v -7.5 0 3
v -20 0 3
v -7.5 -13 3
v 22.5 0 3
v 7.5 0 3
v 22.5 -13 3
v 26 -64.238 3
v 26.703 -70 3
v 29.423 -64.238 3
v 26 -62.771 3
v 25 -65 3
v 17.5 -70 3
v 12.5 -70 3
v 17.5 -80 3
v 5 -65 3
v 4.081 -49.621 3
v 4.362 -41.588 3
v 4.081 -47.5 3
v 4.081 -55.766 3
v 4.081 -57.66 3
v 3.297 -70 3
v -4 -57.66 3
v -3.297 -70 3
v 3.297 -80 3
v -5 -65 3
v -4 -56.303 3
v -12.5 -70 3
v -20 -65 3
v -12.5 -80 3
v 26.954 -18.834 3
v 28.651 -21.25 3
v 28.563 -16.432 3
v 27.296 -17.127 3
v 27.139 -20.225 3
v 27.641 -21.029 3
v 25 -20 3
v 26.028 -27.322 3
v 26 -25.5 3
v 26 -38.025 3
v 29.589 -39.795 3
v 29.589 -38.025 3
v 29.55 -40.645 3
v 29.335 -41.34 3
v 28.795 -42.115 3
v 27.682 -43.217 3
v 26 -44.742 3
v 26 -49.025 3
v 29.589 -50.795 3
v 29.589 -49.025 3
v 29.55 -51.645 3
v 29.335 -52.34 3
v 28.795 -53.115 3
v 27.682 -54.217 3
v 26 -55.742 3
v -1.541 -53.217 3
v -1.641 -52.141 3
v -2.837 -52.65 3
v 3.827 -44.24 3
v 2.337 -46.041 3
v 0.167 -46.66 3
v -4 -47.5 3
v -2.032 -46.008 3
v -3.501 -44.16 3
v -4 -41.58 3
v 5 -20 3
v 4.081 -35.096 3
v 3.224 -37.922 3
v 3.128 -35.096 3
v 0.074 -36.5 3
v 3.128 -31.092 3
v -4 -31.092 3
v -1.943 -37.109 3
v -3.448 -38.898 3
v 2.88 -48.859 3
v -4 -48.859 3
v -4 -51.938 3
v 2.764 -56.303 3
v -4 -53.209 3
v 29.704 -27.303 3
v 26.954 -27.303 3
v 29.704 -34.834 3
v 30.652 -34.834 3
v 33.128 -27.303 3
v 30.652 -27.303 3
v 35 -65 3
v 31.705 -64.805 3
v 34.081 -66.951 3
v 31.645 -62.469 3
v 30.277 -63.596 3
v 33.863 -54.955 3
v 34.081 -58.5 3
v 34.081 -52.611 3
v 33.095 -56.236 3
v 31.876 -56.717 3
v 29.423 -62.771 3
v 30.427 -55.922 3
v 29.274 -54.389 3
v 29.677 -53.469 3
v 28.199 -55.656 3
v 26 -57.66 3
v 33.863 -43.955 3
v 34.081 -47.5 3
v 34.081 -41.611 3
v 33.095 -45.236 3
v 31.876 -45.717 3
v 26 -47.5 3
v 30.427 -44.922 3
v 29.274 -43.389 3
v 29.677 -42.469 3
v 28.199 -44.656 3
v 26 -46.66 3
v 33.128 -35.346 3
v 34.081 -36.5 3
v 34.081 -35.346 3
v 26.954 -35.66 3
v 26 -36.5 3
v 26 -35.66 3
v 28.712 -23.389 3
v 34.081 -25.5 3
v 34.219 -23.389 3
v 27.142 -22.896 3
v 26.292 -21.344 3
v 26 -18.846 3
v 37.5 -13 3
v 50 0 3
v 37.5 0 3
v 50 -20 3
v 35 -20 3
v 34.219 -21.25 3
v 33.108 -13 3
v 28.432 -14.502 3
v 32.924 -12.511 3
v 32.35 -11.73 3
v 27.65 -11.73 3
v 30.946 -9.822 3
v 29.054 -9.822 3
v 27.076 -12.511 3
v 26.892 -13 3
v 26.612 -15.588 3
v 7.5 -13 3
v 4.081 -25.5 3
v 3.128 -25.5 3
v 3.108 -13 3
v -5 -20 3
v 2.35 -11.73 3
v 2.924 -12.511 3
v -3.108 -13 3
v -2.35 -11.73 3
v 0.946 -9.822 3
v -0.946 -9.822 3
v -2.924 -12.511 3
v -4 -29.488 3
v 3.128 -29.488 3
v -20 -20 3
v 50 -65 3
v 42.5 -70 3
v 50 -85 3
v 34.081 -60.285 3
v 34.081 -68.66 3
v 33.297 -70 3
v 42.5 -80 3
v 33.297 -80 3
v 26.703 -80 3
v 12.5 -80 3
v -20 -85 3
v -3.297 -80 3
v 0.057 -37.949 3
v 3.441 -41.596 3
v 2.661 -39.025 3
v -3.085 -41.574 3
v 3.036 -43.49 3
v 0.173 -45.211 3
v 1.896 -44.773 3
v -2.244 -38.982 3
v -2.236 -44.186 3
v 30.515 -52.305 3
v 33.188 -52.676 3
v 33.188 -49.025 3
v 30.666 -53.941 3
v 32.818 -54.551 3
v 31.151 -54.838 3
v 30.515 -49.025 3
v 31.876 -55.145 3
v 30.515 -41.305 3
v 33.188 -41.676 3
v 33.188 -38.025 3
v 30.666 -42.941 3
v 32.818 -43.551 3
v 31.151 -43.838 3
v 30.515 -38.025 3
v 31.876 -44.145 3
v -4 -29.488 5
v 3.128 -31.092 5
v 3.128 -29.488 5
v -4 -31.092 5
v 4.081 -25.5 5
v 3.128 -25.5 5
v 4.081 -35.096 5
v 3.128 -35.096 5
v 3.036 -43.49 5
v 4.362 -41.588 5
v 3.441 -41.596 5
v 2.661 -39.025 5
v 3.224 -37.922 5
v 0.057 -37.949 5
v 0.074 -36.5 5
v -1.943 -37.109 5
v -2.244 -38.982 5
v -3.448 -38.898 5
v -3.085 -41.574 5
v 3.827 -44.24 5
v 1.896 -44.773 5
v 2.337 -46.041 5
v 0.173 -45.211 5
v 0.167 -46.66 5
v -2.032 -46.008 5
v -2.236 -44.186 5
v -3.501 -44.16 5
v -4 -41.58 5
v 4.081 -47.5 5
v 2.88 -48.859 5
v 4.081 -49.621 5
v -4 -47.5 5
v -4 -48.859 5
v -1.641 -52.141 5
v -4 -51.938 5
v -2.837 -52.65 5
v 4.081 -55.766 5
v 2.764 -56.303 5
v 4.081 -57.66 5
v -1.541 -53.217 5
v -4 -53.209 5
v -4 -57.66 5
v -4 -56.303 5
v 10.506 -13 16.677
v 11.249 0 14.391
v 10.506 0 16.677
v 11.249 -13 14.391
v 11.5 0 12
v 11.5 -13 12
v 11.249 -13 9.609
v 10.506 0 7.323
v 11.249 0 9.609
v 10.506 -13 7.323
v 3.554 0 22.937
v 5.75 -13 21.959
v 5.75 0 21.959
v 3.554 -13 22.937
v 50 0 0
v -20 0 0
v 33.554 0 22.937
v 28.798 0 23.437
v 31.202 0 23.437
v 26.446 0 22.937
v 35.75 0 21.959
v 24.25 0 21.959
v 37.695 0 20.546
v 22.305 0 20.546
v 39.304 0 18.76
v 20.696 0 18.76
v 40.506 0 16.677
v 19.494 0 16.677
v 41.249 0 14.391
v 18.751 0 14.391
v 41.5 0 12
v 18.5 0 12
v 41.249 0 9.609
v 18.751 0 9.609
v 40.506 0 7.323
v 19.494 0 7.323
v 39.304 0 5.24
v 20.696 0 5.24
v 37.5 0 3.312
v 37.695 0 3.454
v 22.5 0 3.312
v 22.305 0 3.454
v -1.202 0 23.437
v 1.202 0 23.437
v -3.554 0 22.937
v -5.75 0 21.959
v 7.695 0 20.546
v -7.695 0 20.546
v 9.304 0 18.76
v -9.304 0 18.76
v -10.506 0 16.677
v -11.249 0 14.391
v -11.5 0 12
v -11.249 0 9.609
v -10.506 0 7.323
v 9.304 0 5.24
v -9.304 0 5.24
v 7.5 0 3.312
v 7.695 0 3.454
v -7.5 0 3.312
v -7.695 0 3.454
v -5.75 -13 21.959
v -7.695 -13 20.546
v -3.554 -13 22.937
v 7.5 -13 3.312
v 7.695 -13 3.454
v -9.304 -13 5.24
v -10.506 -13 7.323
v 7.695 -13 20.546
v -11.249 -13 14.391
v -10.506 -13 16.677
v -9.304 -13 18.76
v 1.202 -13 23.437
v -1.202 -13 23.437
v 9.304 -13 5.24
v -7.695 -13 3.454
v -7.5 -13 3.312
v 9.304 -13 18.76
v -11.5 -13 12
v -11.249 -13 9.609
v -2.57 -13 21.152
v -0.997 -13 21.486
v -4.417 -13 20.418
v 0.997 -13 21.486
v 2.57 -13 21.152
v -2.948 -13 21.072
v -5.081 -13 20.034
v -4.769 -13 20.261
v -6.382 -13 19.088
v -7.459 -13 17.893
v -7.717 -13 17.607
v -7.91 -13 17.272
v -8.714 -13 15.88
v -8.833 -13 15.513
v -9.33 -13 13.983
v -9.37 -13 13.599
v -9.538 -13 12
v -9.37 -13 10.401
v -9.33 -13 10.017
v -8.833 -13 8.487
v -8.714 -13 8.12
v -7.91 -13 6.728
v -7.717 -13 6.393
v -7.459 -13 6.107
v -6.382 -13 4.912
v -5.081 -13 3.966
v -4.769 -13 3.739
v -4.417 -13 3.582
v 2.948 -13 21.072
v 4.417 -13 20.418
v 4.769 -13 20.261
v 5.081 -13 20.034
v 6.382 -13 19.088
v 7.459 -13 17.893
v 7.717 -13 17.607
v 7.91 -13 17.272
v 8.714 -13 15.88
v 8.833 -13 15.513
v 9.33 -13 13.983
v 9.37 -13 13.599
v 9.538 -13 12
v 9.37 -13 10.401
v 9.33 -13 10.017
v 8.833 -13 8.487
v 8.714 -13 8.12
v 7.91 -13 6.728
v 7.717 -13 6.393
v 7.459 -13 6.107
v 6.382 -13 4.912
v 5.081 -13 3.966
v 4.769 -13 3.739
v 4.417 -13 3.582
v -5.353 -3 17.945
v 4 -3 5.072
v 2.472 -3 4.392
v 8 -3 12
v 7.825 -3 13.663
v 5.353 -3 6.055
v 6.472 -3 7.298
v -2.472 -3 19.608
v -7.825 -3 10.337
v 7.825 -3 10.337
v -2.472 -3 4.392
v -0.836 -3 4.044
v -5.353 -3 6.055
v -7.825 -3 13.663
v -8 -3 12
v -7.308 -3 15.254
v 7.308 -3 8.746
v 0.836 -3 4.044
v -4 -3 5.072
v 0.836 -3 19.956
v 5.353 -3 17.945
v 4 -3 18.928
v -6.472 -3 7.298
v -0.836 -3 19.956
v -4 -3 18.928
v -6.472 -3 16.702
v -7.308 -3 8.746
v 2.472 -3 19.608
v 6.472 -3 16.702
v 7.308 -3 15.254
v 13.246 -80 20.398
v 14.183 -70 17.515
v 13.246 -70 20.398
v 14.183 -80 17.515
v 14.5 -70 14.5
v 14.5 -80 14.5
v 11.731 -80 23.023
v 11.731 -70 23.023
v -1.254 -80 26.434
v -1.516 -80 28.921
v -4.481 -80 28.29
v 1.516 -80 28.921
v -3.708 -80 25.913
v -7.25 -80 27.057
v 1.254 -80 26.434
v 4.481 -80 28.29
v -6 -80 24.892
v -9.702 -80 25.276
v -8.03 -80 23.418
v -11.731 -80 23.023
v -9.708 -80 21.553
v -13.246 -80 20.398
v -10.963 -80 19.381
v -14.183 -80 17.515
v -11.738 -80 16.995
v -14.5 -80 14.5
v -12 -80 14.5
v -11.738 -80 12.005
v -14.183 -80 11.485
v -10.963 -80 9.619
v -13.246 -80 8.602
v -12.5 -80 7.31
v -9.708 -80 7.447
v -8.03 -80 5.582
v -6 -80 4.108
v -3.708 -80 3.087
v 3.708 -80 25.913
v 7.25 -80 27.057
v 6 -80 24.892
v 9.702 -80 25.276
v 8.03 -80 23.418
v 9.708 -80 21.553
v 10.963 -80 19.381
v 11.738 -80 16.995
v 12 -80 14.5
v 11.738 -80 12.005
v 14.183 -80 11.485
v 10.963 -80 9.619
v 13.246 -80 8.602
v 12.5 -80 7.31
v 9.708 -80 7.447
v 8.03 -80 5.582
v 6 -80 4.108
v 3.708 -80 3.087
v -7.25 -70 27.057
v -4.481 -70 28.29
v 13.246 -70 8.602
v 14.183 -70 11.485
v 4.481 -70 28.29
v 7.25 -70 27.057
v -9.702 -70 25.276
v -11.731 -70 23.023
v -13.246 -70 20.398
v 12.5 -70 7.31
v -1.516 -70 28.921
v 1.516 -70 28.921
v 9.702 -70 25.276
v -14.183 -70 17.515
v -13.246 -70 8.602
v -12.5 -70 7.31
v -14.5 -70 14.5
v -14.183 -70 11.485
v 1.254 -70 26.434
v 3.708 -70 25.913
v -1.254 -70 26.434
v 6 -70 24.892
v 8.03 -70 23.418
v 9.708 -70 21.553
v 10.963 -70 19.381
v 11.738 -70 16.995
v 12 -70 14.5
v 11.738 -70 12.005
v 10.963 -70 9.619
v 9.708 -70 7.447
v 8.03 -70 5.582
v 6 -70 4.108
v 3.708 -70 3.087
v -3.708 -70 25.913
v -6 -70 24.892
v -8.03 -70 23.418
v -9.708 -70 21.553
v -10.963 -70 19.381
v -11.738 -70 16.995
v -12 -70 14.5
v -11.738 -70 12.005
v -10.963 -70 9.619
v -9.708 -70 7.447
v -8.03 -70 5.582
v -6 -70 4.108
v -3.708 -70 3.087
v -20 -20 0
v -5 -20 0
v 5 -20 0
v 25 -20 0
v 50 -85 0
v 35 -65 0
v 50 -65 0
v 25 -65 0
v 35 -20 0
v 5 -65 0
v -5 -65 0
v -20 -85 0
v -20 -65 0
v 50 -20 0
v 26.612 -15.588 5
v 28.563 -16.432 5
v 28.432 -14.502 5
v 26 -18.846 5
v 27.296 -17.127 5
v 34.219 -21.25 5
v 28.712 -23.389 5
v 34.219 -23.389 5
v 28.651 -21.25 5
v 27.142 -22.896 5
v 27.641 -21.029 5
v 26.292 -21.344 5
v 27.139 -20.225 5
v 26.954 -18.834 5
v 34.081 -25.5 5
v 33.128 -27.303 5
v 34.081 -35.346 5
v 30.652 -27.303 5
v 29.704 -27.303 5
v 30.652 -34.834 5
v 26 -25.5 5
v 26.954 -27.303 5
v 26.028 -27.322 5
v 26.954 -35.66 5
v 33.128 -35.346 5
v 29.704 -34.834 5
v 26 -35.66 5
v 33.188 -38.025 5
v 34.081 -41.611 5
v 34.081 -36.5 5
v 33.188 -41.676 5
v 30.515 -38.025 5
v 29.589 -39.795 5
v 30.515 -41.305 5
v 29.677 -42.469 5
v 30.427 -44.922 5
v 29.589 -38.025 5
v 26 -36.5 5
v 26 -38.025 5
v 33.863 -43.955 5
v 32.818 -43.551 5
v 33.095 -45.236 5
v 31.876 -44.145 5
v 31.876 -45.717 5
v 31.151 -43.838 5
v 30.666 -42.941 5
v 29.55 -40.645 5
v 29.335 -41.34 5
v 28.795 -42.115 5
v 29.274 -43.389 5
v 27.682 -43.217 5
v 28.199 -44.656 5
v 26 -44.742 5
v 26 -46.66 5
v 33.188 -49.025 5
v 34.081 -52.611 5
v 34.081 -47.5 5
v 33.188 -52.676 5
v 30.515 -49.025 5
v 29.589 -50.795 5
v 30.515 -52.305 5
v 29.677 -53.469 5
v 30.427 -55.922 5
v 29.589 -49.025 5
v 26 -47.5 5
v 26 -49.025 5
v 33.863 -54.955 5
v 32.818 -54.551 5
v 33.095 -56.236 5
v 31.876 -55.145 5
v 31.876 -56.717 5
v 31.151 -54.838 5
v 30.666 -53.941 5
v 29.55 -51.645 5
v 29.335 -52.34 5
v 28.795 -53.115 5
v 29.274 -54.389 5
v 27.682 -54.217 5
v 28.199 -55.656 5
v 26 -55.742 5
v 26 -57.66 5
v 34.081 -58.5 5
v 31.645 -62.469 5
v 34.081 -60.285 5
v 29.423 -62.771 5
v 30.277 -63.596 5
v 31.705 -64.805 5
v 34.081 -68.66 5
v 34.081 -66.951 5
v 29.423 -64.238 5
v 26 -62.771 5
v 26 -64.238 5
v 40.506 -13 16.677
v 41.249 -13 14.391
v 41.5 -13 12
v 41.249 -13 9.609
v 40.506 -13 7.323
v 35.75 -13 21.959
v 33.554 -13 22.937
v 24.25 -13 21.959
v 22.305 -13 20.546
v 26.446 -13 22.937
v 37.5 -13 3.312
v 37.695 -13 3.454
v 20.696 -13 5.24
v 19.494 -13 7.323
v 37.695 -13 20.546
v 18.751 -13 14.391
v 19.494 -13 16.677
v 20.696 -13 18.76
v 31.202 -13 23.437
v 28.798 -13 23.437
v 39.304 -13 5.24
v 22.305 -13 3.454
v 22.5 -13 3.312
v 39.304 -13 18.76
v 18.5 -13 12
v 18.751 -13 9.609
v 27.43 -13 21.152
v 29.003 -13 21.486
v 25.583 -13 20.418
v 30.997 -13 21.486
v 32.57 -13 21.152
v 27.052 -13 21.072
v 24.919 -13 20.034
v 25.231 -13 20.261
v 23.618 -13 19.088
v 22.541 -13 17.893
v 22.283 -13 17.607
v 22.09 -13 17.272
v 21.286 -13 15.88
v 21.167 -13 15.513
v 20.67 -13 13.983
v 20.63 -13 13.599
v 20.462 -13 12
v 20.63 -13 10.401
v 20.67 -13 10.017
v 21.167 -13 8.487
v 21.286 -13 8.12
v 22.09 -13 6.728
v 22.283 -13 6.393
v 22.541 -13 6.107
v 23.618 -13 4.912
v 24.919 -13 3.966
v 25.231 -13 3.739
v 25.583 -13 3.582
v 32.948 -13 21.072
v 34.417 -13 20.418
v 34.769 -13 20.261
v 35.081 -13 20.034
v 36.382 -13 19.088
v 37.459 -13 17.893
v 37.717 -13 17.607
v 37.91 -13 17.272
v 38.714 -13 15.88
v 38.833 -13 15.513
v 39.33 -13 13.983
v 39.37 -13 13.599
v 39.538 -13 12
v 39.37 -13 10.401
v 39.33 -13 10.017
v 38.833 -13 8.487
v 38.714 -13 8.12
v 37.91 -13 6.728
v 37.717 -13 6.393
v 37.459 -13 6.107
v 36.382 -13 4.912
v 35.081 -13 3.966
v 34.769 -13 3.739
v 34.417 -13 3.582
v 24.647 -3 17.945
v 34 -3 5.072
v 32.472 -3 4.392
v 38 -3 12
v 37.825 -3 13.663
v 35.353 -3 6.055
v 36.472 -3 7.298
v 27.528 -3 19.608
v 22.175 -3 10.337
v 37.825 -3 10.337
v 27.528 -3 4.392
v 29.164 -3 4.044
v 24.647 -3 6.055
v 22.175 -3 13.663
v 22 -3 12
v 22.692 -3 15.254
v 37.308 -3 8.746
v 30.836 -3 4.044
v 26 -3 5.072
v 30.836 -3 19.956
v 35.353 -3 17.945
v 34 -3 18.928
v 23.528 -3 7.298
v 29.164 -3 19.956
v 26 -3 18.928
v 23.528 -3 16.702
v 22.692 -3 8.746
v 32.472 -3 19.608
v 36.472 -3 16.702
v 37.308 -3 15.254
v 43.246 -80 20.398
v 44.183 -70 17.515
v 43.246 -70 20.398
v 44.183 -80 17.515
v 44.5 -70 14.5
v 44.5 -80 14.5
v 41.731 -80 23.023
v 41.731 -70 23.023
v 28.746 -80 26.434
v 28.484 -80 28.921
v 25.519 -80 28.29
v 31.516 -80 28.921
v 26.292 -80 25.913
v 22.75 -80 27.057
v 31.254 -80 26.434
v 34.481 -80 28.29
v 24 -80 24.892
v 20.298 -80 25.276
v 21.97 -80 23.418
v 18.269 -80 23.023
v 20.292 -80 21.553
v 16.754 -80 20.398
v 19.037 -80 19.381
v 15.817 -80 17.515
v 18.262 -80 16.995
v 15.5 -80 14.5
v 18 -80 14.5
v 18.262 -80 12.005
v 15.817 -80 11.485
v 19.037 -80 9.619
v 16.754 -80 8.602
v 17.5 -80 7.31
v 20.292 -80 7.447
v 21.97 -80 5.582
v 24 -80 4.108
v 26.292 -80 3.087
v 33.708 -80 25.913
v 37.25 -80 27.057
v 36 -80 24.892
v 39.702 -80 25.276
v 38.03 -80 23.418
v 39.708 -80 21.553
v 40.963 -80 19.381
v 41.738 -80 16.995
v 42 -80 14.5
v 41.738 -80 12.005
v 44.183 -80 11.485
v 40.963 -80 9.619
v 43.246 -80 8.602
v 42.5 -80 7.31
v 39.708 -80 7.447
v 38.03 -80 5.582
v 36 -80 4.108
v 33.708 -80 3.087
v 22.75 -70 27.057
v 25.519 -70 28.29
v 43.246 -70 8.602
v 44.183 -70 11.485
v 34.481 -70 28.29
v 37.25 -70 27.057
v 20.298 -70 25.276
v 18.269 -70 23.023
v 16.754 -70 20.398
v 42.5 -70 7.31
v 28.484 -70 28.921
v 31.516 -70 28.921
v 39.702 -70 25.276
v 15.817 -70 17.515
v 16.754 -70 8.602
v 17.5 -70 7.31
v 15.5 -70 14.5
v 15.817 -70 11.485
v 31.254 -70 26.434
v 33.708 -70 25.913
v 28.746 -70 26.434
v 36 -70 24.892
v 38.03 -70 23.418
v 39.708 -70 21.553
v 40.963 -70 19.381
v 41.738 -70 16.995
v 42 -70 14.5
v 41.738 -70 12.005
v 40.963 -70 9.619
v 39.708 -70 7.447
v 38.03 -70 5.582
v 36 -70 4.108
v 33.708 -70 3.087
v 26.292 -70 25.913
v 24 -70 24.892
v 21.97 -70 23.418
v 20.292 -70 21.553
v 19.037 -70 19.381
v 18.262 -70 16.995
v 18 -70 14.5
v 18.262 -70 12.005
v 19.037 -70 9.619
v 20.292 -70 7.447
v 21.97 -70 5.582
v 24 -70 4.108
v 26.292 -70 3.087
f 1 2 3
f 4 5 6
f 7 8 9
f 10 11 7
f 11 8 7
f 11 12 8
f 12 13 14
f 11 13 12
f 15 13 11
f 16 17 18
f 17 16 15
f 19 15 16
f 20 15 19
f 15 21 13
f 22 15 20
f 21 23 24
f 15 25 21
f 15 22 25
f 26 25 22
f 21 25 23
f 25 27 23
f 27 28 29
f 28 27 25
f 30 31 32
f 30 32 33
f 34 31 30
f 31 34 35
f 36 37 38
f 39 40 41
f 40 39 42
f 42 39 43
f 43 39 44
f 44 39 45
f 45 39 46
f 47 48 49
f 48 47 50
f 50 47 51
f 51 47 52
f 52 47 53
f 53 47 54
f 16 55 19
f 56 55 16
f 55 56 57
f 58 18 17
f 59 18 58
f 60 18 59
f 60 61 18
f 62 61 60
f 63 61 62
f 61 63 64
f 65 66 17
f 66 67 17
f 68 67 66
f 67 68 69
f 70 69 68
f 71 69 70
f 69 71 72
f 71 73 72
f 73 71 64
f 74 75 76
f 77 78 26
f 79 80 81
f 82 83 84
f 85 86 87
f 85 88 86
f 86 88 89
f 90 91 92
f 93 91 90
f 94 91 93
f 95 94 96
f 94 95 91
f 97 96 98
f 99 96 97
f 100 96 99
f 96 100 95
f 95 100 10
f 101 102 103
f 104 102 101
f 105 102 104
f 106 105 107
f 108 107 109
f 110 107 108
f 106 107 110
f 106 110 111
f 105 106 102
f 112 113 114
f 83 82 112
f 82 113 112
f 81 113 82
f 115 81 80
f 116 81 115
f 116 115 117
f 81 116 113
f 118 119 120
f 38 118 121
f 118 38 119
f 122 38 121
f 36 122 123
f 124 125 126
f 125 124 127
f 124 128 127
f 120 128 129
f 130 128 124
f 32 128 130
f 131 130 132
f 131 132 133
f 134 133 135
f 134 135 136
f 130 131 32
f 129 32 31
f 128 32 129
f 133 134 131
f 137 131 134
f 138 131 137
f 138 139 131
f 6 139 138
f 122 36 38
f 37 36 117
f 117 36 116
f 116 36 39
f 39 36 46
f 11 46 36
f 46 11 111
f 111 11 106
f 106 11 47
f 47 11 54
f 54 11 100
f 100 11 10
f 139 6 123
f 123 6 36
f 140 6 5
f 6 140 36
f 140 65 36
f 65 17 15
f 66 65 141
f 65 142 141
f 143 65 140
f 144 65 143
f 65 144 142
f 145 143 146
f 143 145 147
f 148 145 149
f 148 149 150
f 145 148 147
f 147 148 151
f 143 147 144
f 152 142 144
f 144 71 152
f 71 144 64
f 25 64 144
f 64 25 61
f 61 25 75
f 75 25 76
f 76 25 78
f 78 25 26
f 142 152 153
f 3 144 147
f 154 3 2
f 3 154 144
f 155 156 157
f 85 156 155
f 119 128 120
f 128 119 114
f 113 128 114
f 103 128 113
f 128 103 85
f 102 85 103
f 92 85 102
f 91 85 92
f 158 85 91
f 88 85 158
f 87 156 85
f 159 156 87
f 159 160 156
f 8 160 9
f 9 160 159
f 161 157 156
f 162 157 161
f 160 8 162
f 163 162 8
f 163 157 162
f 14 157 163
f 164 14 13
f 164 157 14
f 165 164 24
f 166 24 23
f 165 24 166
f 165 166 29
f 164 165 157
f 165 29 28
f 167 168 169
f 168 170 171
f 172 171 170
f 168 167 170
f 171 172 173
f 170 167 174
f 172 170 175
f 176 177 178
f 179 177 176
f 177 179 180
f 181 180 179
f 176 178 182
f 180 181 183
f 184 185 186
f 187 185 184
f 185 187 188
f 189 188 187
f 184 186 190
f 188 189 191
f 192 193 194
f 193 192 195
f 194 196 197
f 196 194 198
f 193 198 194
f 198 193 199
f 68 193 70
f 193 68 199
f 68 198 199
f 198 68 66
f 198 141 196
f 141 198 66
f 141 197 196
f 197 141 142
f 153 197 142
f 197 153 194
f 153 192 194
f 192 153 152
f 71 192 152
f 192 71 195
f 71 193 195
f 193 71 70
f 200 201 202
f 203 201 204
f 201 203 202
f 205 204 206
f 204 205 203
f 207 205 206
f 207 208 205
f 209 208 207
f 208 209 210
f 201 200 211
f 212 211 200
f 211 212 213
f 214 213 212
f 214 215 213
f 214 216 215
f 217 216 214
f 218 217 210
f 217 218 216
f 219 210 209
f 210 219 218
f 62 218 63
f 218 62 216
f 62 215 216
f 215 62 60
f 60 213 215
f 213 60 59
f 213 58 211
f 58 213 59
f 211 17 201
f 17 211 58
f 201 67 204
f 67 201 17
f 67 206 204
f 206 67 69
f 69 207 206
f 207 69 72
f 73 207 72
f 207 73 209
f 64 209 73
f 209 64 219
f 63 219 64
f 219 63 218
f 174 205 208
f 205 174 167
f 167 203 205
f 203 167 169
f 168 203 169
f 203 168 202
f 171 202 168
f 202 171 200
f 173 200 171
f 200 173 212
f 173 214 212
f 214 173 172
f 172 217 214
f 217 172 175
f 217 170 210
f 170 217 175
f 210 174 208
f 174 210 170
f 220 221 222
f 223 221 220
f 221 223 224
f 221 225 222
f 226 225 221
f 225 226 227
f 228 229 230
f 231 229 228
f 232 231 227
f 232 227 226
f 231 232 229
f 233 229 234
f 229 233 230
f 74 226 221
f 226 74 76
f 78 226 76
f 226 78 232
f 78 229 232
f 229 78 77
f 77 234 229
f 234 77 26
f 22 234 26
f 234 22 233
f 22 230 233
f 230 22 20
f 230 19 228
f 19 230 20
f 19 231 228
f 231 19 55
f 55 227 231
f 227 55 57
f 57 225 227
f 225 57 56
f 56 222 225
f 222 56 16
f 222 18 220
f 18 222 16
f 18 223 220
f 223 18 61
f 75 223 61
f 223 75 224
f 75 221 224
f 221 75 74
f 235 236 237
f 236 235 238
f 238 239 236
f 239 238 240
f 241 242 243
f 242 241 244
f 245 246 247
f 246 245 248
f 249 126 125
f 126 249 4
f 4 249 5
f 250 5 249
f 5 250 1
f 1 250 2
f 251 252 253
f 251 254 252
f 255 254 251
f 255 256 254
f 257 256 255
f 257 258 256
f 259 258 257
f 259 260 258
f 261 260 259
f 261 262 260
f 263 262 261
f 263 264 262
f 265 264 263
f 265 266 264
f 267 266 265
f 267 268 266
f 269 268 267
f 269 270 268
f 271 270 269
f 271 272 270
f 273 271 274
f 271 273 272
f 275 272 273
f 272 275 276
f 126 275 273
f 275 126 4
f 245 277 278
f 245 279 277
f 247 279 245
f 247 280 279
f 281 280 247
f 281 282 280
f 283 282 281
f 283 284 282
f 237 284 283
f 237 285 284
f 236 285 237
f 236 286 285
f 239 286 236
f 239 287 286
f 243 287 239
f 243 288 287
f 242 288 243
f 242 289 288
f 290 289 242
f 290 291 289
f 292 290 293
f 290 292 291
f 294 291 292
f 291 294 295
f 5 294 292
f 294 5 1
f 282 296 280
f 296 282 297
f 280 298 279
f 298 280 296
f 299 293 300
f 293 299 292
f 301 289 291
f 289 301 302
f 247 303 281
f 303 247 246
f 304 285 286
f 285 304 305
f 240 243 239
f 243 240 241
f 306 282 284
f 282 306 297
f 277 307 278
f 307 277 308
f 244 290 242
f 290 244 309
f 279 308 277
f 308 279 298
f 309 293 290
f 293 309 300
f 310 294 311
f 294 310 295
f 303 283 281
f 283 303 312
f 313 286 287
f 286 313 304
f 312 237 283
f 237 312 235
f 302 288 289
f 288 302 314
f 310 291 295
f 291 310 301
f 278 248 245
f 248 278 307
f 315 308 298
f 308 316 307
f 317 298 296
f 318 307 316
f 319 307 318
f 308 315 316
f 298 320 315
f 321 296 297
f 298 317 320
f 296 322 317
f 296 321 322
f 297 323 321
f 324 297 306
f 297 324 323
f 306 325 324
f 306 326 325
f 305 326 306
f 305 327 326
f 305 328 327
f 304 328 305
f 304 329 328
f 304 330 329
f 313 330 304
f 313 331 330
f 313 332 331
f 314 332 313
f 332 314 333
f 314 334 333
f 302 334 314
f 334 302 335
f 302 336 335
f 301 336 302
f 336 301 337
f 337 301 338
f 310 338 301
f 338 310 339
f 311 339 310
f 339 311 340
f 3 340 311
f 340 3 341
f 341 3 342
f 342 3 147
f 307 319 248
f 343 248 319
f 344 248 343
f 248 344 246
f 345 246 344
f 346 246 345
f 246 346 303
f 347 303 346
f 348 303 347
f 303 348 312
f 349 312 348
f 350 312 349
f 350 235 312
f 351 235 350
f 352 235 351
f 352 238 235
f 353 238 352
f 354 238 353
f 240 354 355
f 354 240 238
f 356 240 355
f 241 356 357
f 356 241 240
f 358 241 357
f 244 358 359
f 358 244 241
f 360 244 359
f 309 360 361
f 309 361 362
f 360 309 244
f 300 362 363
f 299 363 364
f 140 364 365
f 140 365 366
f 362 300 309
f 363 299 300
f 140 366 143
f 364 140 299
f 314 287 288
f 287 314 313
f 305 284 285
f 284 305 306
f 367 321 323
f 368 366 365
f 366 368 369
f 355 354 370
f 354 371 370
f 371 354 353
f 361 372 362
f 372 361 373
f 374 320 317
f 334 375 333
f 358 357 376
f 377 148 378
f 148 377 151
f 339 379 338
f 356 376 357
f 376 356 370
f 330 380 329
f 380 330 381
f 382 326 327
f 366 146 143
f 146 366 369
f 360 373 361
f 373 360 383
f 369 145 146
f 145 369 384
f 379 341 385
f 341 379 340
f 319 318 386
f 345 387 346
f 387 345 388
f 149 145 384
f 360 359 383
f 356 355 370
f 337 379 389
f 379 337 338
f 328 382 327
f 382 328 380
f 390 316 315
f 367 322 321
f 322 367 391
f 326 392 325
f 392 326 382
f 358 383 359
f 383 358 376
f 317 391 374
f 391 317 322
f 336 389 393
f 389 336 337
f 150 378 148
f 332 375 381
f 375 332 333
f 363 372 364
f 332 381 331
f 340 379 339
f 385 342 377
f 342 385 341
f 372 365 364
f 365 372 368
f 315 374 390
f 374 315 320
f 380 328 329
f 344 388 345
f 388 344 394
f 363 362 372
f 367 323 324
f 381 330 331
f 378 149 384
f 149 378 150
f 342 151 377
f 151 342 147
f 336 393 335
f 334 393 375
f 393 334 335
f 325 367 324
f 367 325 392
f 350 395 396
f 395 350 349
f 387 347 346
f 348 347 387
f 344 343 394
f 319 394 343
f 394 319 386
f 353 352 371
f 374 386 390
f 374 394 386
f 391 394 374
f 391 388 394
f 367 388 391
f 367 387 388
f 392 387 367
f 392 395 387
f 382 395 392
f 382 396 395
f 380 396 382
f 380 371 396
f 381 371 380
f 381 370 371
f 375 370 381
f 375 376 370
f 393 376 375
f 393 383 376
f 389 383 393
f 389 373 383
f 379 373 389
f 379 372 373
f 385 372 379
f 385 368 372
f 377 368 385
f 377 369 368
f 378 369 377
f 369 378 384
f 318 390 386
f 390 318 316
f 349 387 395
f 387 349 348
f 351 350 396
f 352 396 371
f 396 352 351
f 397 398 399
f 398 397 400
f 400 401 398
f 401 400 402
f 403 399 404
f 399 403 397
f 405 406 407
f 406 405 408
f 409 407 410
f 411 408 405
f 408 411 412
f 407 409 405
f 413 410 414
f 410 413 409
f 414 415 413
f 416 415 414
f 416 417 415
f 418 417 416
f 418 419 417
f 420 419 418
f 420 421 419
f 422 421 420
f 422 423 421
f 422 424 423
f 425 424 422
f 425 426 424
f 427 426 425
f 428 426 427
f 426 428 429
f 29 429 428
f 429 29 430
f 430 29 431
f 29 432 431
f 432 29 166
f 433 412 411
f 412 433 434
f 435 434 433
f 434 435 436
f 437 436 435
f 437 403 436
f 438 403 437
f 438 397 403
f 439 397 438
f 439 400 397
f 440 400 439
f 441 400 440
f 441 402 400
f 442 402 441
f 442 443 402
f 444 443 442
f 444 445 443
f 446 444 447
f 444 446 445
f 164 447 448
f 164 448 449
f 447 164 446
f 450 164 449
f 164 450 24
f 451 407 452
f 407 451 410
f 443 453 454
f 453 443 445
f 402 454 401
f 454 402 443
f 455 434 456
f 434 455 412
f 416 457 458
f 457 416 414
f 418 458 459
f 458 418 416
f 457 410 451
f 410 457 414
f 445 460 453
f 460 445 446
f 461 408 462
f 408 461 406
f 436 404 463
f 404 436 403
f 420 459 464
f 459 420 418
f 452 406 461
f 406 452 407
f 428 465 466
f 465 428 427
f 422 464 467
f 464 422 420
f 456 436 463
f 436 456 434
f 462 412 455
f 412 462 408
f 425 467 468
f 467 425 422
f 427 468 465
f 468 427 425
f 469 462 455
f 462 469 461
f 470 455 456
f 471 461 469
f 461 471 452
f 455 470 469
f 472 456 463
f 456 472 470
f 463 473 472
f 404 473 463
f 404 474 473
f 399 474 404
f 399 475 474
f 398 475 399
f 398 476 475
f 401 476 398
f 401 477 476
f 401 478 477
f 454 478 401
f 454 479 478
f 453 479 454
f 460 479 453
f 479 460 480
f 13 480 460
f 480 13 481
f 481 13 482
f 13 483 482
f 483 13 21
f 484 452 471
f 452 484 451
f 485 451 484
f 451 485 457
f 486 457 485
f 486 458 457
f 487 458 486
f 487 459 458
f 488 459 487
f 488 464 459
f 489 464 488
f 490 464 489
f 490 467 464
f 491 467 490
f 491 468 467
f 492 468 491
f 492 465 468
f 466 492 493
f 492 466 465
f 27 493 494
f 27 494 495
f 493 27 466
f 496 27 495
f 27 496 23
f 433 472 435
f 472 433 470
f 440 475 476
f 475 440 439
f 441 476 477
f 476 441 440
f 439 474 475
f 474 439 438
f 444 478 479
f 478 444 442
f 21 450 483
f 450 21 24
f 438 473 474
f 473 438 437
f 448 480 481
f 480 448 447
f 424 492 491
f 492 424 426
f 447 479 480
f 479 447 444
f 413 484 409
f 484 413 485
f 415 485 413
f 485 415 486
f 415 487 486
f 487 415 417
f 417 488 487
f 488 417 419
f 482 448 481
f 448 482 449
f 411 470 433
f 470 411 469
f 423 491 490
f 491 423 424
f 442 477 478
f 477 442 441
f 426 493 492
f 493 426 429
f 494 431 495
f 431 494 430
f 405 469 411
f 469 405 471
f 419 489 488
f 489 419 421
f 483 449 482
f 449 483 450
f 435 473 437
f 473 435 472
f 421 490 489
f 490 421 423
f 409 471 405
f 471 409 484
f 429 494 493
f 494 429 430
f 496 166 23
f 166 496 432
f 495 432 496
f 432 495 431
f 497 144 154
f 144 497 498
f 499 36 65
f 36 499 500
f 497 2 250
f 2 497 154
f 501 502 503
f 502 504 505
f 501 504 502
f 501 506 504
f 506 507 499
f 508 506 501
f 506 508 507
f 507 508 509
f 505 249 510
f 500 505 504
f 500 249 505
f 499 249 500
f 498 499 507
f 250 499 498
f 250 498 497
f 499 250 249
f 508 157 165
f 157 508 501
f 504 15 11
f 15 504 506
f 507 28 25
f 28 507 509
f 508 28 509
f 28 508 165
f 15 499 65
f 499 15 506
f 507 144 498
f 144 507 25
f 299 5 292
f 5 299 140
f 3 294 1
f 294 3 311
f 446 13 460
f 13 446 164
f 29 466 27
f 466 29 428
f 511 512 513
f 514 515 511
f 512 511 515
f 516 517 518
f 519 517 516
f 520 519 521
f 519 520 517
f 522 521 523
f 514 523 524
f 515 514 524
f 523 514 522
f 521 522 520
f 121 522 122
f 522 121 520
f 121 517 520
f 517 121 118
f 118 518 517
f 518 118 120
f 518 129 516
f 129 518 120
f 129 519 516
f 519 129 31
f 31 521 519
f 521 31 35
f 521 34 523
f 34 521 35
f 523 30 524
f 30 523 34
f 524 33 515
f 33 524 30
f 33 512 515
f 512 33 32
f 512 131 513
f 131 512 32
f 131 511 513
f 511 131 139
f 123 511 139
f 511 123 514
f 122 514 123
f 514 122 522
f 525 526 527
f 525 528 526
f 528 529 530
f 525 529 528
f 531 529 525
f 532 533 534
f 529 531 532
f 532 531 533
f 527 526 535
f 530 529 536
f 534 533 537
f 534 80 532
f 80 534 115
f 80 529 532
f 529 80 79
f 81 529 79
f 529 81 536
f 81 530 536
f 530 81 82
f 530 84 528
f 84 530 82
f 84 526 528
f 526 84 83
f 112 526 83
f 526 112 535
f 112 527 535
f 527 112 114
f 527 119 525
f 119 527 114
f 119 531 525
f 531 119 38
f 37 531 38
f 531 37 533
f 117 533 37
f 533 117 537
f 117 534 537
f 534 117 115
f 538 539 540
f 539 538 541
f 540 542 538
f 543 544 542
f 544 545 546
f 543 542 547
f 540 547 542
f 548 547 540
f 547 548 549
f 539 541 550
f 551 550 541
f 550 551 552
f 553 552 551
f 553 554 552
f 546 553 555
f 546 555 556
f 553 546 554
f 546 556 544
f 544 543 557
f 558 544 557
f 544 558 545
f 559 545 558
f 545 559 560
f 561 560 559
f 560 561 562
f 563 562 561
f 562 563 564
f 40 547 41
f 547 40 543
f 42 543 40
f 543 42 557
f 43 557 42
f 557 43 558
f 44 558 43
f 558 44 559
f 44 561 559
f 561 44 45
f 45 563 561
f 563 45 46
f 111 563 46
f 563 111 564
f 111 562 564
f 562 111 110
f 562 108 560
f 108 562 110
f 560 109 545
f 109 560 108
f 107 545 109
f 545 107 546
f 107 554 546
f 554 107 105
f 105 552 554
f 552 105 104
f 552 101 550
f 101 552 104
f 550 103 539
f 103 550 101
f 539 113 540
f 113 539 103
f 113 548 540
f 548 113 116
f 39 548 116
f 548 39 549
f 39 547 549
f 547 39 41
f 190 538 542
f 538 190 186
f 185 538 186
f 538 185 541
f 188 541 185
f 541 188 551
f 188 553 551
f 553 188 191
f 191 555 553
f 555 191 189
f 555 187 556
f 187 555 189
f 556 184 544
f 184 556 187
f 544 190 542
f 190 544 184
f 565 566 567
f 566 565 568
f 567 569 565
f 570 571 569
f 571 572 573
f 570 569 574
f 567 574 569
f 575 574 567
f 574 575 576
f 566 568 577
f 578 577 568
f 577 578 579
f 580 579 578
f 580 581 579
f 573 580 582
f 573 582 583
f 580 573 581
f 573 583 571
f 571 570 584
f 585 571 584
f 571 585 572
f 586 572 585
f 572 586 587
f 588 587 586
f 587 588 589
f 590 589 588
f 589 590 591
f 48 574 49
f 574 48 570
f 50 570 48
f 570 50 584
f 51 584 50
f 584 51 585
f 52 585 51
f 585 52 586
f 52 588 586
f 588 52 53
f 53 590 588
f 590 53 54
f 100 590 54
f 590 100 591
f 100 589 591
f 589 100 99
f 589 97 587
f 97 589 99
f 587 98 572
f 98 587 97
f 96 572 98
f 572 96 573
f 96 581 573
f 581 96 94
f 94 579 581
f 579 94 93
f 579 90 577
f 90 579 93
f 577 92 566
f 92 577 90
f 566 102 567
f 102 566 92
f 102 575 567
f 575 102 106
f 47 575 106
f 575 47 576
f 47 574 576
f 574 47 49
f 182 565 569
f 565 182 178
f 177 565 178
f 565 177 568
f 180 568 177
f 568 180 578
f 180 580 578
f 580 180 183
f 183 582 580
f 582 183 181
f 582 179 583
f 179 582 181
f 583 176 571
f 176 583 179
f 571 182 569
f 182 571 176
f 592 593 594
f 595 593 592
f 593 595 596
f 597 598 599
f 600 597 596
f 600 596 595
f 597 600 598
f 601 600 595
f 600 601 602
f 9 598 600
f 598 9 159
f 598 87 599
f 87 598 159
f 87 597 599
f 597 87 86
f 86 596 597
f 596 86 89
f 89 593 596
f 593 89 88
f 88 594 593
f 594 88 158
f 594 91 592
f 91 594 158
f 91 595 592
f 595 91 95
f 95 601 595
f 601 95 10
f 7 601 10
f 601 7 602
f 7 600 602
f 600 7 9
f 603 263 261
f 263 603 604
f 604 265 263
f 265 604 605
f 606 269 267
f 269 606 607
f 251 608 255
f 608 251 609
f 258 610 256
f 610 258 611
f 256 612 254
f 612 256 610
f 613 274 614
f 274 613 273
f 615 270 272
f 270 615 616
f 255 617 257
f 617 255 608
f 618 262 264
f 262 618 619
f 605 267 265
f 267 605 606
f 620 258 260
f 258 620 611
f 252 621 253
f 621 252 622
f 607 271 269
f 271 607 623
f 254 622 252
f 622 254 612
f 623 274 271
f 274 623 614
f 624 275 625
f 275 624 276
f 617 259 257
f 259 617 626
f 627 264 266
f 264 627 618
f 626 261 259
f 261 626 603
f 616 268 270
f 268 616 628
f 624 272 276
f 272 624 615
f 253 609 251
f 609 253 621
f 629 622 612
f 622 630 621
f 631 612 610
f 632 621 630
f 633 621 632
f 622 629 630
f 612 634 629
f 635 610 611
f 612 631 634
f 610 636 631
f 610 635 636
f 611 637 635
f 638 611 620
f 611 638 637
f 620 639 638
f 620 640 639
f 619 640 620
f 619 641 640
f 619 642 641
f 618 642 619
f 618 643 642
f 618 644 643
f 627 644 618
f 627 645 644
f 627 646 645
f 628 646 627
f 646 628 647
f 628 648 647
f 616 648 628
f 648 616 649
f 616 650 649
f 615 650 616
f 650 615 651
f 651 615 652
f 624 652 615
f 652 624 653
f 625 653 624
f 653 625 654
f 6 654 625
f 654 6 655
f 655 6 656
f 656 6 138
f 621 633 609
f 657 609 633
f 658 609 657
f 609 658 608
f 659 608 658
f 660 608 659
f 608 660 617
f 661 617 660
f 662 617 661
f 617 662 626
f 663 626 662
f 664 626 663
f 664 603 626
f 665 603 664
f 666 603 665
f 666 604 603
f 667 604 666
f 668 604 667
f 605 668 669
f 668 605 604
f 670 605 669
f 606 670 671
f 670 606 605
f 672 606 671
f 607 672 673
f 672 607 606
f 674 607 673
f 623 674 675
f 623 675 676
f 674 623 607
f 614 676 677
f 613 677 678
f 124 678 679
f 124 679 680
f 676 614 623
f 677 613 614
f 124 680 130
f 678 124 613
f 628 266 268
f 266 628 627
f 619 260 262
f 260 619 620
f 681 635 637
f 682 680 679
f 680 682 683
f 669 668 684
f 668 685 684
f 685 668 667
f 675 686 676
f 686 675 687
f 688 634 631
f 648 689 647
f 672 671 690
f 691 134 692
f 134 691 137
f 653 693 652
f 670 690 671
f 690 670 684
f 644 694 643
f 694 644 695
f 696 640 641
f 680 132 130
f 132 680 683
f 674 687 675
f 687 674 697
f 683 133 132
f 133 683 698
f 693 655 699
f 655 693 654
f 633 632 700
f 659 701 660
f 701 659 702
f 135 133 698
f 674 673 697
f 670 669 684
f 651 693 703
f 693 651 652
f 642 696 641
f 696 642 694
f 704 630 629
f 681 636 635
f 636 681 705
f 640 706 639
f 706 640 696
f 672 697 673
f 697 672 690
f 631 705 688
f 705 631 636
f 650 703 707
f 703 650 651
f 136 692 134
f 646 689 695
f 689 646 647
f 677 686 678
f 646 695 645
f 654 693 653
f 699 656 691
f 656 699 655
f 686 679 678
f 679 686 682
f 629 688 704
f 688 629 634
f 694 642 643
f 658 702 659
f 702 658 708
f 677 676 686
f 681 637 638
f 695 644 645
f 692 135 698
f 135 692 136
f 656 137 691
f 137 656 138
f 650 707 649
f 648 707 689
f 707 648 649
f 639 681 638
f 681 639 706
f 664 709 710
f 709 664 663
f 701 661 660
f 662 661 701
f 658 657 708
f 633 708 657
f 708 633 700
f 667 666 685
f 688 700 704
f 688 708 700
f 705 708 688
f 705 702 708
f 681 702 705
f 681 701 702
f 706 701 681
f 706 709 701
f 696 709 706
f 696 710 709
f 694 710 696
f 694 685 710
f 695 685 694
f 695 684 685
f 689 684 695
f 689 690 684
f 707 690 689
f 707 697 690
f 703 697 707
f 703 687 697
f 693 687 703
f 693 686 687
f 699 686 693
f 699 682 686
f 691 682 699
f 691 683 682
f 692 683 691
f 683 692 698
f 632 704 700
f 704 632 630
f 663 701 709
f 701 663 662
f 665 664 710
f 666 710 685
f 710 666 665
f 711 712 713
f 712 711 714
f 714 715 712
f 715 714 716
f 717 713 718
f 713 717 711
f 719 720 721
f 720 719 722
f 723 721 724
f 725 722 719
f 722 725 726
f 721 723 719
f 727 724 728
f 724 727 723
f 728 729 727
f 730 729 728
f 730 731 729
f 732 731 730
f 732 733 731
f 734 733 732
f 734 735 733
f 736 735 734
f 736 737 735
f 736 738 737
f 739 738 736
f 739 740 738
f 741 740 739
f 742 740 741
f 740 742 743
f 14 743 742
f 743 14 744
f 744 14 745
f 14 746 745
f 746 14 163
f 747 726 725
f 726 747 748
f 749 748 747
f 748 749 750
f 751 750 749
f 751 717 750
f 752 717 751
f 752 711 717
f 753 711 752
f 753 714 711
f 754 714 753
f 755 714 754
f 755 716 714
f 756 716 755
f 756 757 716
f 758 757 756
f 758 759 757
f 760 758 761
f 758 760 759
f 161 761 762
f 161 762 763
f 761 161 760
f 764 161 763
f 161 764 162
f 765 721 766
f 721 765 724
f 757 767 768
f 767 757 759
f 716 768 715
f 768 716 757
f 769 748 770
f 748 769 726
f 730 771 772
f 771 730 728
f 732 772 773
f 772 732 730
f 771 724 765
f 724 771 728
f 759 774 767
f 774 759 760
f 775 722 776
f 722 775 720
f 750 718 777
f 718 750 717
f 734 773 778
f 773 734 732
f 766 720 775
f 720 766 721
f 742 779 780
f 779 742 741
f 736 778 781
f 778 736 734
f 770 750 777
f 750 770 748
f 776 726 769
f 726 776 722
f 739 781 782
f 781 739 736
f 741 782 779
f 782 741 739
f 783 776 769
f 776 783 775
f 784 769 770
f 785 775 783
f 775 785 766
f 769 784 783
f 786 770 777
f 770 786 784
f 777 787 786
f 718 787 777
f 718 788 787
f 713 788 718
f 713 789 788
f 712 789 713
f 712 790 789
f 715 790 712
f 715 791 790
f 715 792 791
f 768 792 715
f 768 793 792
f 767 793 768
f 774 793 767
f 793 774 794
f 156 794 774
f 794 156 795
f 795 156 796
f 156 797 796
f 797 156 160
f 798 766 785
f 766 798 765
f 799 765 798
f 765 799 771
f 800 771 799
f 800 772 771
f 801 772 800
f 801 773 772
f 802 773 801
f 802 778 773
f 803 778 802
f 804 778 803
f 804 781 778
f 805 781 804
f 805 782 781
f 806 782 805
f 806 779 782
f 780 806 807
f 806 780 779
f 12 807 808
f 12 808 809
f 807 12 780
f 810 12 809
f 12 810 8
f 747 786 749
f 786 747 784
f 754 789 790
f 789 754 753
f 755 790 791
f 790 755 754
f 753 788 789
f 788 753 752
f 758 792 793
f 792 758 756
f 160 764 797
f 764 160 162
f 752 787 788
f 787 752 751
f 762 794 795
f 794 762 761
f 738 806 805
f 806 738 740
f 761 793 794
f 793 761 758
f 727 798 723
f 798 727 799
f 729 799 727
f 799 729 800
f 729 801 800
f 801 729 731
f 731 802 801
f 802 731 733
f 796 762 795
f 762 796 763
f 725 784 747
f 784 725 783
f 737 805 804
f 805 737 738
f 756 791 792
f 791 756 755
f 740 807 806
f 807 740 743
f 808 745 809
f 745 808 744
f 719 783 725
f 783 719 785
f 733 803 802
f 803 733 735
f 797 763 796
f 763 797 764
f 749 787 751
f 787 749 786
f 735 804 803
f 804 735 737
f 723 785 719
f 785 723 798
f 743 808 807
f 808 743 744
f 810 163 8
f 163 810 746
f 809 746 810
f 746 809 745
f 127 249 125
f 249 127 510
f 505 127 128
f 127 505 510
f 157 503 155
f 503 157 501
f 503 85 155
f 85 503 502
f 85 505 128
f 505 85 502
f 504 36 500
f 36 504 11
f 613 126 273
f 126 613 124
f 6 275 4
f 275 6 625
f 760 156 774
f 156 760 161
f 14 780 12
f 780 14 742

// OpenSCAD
include <Write.scad>

/*
 * configuration
 */
names = ["TOM", "JERRY"];
brushes_count = len(names);
//$fn=200;

/*
 * modules
 */

module lower_tub()
{
  translate([0, (20+4)/2, 0])
    difference()
    {
      cylinder(h=10+3, r=(20+3)/2);
      translate([0,0,3])
        cylinder(h=10+3, r2=20/2, r1=16/2);
    }
}

module upper_ring()
{
  translate([0, (24+5)/2, 0])
    difference()
    {
      cylinder(h=10, r=(24+5)/2);
      cylinder(h=10, r=(24+0)/2);
    }
}


module back_wall()
{
  // lower part
  translate([-40/2, 0, 0])
    cube([40, 3, 20]);
  // upper part
  translate([-40/2, 0, 100-10-25])
    cube([40, 3, 20]);
  // connector
  translate([-10/2, 0, 0])
    cube([10, 3, 100-25]);
}


module brush_holder()
{
  lower_tub();
  translate([0,0,100-5-25])
    upper_ring();
  back_wall();
  // lower mounting
  difference()
  {
    translate([-15/2, 3, 0])
      cube([15, 4, 10+3]);
    translate([0, 0.1, 0]) // needed to make model simple (aka: manifold)
      hull()
        lower_tub();
  }
  // upper mounting
  translate([0, 0, 100-5-25])
  {
    difference()
    {
      translate([-25/2, 3, 0])
        cube([25, 10, 10]);
      translate([0, 0.1, 0]) // needed to make model simple (aka: manifold)
        hull()
          upper_ring();
    }
  }
}


/*
 * main program
 */

rotate([90, 0, 0])
{
  for(i = [0:brushes_count-1])
  {
    translate([i*30,4,42])
      rotate([-90, -90, 0])
        scale([2,1,1])
          write(names[i], t=2, h=8, center=true);
    translate(i * [30, 0, 0])
      brush_holder();
  }
}
